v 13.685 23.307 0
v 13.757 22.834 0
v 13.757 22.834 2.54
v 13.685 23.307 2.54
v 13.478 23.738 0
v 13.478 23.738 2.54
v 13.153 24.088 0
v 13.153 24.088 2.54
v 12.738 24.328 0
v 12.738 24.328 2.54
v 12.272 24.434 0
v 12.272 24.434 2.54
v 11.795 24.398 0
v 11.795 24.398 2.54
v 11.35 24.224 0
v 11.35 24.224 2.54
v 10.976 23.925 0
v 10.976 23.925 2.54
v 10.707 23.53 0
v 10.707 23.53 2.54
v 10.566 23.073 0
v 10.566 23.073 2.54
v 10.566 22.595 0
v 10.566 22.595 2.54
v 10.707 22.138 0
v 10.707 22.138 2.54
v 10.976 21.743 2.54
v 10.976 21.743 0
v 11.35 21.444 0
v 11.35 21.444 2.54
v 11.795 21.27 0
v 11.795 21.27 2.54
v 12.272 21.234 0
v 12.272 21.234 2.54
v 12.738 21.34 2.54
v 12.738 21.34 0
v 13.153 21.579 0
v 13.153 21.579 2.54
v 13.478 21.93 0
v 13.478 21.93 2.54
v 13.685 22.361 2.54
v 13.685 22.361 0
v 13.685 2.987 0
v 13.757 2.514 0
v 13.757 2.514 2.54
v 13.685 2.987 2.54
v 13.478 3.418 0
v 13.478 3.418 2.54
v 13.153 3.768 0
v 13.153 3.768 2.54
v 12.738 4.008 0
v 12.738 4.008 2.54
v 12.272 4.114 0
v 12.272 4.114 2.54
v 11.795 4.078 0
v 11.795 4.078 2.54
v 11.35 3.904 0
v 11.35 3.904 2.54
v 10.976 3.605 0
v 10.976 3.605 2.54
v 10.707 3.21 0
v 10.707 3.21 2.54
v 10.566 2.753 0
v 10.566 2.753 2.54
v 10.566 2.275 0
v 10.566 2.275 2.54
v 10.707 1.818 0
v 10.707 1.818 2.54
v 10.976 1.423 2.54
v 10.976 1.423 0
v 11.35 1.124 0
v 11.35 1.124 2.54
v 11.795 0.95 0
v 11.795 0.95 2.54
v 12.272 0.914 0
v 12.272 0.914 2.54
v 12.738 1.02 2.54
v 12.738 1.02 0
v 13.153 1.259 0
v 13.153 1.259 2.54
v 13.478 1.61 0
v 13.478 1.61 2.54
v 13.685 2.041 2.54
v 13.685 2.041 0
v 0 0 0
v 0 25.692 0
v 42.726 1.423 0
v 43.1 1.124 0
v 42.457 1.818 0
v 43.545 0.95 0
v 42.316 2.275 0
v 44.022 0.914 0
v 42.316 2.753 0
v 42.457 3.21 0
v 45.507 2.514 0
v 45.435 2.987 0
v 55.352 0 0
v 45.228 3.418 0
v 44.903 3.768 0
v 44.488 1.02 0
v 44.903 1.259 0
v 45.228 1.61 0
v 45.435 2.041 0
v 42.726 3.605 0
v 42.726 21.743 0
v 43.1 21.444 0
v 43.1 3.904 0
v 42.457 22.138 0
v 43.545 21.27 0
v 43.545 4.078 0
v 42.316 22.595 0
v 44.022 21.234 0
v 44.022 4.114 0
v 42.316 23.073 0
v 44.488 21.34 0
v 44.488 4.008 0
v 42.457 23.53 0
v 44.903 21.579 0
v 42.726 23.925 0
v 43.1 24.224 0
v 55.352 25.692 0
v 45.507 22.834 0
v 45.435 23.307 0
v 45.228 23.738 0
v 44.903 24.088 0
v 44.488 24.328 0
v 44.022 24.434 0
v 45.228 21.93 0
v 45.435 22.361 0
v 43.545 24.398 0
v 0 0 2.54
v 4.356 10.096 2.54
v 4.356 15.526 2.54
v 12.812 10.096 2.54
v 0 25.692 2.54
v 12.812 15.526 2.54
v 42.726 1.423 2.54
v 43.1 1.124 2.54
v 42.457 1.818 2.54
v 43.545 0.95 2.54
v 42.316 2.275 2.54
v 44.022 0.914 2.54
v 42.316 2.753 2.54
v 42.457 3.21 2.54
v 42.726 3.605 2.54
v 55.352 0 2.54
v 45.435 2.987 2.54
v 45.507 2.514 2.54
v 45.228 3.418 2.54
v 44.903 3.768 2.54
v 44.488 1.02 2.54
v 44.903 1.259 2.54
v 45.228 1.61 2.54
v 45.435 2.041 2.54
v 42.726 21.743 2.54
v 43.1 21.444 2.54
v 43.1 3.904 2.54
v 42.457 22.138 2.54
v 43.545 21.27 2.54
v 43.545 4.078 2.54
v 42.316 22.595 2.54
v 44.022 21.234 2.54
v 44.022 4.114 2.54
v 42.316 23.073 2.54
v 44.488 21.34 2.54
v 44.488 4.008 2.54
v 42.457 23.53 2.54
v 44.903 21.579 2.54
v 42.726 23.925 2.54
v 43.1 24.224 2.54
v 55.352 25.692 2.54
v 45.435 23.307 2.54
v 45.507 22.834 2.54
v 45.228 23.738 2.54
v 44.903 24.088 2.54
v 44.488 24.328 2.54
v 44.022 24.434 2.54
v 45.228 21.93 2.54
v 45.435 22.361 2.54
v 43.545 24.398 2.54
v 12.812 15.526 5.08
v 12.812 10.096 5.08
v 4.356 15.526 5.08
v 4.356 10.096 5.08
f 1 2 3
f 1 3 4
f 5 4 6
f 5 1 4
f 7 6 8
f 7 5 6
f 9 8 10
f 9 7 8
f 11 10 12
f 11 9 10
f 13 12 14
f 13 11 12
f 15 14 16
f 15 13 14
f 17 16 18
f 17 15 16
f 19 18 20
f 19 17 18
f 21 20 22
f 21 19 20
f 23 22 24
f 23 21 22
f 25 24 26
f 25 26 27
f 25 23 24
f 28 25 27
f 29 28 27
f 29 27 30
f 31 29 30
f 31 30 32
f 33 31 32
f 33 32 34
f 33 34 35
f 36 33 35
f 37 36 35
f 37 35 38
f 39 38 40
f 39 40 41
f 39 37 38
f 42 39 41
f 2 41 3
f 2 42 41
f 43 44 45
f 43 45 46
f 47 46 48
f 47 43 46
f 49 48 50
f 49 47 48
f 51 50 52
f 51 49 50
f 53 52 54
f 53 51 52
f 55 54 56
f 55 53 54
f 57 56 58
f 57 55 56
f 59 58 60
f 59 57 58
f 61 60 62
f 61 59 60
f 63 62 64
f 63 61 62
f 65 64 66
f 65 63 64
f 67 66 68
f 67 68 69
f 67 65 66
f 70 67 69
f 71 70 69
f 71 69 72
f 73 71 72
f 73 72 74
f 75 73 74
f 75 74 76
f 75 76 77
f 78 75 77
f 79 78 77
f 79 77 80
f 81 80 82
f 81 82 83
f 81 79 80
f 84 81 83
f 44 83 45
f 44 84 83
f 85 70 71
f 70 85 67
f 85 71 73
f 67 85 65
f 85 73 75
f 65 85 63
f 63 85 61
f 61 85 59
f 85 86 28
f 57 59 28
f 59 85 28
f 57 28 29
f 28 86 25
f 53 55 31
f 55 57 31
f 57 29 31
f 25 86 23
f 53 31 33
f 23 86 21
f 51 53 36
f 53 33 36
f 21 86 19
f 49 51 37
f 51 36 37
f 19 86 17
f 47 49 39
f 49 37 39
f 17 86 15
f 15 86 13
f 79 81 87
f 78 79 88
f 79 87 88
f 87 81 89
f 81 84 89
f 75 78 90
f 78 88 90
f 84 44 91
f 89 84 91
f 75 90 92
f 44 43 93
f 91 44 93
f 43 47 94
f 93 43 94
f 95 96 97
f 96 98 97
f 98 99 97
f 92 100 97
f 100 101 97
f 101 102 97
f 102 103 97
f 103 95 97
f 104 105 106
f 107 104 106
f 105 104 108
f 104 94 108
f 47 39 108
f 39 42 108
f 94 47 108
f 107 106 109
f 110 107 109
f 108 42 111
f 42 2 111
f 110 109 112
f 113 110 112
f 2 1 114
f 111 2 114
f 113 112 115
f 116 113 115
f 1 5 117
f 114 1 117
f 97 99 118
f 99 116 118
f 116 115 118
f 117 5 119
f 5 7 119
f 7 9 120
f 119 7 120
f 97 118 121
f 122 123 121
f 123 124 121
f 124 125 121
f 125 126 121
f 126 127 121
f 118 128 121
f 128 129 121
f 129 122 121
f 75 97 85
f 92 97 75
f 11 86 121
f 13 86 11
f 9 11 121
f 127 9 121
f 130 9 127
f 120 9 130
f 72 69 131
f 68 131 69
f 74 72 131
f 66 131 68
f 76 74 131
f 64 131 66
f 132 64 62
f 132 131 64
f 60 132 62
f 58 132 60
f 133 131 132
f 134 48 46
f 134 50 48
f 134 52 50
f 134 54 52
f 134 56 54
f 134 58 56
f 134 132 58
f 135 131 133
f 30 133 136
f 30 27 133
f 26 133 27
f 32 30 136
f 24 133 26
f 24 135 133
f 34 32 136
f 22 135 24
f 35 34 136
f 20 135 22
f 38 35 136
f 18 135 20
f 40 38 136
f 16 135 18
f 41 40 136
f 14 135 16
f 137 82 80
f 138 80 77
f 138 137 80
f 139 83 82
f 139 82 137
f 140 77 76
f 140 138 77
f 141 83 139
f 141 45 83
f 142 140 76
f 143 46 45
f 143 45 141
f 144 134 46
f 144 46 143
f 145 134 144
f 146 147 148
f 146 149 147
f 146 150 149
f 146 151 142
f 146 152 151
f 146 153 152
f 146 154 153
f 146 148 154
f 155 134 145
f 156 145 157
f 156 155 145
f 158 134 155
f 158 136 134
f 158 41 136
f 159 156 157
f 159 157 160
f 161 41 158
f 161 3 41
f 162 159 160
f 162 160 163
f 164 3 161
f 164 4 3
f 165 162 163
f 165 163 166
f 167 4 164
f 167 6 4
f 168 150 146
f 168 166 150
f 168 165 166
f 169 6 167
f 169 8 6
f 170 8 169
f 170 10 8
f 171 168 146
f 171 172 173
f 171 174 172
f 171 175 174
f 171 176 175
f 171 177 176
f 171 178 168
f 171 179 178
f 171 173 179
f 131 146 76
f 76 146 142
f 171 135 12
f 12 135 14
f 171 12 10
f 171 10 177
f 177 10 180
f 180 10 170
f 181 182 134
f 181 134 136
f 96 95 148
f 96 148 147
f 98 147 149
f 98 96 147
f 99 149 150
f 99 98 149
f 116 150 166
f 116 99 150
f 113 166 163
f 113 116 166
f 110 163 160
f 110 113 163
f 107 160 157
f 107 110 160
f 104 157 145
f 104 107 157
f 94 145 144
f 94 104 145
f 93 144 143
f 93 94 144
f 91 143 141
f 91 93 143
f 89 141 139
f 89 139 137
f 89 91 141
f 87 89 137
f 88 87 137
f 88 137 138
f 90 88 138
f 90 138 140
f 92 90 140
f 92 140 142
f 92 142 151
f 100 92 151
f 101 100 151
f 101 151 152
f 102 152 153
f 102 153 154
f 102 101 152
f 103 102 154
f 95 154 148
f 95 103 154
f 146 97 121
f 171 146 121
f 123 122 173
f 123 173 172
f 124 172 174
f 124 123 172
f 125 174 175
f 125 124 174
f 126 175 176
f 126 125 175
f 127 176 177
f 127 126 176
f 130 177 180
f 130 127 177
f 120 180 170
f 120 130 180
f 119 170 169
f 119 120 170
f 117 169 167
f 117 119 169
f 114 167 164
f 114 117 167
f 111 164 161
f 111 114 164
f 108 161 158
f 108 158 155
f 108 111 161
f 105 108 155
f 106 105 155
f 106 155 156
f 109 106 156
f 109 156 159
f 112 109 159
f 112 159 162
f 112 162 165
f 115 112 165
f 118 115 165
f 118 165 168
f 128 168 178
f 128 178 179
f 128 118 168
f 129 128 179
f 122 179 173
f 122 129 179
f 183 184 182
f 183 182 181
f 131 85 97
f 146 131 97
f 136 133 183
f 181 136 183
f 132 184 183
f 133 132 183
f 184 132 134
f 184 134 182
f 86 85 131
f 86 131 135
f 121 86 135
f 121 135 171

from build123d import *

# Parameters (mm, degrees)
SKETCH2_W               = 55.351920974
SKETCH2_H               = 25.692475641
SKETCH2_R               = 1.604575537
BOSS_EXTRUDE1_DEPTH     = 2.54
BOSS_EXTRUDE2_START     = 4.355808651
BOSS_EXTRUDE2_OUTLINE_W = 5.429648603
BOSS_EXTRUDE2_OUTLINE_H = 2.54
BOSS_EXTRUDE2_DEPTH     = 8.456135595


# Read off the part's stored shape, not the designer's step: Boss-Extrude2
with BuildPart() as part:
    # Sketch2 → Boss-Extrude1 (new body)
    with BuildSketch(Plane.XY):
        with Locations((27.675960487, 12.846237821)):
            Rectangle(SKETCH2_W, SKETCH2_H)
        with Locations((12.152179379, 2.513985209)):
            Circle(SKETCH2_R, mode=Mode.SUBTRACT)
        with Locations((43.902179379, 2.513985209)):
            Circle(SKETCH2_R, mode=Mode.SUBTRACT)
        with Locations((43.902179379, 22.833985209)):
            Circle(SKETCH2_R, mode=Mode.SUBTRACT)
        with Locations((12.152179379, 22.833985209)):
            Circle(SKETCH2_R, mode=Mode.SUBTRACT)
    extrude(amount=BOSS_EXTRUDE1_DEPTH)

    # Boss-Extrude2 outline → Boss-Extrude2 (add)
    with BuildSketch(Plane.YZ.offset(BOSS_EXTRUDE2_START)):
        with Locations((12.810955728, 3.81)):
            Rectangle(BOSS_EXTRUDE2_OUTLINE_W, BOSS_EXTRUDE2_OUTLINE_H)
    extrude(amount=BOSS_EXTRUDE2_DEPTH)


solid = part.part
